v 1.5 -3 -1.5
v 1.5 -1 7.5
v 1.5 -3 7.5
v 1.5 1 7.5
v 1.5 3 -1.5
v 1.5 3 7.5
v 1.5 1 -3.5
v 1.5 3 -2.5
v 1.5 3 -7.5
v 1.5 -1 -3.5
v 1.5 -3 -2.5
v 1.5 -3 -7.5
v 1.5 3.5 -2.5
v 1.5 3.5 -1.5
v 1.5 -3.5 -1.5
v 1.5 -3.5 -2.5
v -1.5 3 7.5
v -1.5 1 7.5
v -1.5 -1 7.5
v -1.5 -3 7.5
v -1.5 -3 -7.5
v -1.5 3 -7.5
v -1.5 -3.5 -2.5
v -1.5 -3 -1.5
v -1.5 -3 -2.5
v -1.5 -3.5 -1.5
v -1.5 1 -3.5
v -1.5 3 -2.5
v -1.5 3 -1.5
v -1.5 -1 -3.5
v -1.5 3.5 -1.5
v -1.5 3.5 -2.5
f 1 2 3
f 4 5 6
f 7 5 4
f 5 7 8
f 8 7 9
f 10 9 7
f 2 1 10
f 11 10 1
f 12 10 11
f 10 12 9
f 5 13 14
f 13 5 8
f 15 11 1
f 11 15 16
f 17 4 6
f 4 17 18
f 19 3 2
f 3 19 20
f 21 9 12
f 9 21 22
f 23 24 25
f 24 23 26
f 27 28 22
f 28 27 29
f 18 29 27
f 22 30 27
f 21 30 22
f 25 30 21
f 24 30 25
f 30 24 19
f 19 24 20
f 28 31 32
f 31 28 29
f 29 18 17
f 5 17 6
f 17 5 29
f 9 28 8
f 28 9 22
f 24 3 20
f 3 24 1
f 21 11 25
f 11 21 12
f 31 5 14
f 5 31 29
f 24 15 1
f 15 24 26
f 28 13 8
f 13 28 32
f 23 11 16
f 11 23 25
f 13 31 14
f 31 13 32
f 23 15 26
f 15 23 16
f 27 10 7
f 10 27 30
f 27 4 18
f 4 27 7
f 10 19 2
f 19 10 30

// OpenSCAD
$fn = 48;

union() {
	color(c = "Green") {
		difference() {
			union() {
				cube(center = true, size = [3, 6, 15]);
				translate(v = [0, 0, -2]) {
					cube(center = true, size = [3, 7, 1]);
				}
			}
			translate(v = [0, 0, 4]) {
				cube(center = true, size = [6, 2.0000000000, 15]);
			}
		}
	}
}
/***********************************************
*********      SolidPython code:      **********
************************************************
 
#! /usr/bin/env python
# -*- coding: utf-8 -*-
from __future__ import division
import os
import sys

# Assumes SolidPython is in site-packages or elsewhwere in sys.path
from solid import *
from solid.utils import *

SEGMENTS = 48


def pin():
    x = 3
    y = 6
    z = 15
    
    pin_core = cube([x,y,z], center=True)
    #Tab of 1 by 1 extra
    tab = cube([x,y+1,1], center = True)    
    # z = 15, so middle is 7.5 and middle tab, so to be at 6 middle -2
    tab = down(2)(tab)

    # double x to make manifold, third of the middle, up by 4
    center_hole = up(4)(cube([x*2,y/3,z], center=True))

    pin =   color("Green")(pin_core + tab - center_hole )
    return pin



def assembly():
    # Your code here!
    a = union()
    a = a + pin()

    return a

if __name__ == '__main__':
    a = assembly()
    scad_render_to_file(a, file_header='$fn = %s;' % SEGMENTS, include_orig_code=True)

 
 
************************************************/
